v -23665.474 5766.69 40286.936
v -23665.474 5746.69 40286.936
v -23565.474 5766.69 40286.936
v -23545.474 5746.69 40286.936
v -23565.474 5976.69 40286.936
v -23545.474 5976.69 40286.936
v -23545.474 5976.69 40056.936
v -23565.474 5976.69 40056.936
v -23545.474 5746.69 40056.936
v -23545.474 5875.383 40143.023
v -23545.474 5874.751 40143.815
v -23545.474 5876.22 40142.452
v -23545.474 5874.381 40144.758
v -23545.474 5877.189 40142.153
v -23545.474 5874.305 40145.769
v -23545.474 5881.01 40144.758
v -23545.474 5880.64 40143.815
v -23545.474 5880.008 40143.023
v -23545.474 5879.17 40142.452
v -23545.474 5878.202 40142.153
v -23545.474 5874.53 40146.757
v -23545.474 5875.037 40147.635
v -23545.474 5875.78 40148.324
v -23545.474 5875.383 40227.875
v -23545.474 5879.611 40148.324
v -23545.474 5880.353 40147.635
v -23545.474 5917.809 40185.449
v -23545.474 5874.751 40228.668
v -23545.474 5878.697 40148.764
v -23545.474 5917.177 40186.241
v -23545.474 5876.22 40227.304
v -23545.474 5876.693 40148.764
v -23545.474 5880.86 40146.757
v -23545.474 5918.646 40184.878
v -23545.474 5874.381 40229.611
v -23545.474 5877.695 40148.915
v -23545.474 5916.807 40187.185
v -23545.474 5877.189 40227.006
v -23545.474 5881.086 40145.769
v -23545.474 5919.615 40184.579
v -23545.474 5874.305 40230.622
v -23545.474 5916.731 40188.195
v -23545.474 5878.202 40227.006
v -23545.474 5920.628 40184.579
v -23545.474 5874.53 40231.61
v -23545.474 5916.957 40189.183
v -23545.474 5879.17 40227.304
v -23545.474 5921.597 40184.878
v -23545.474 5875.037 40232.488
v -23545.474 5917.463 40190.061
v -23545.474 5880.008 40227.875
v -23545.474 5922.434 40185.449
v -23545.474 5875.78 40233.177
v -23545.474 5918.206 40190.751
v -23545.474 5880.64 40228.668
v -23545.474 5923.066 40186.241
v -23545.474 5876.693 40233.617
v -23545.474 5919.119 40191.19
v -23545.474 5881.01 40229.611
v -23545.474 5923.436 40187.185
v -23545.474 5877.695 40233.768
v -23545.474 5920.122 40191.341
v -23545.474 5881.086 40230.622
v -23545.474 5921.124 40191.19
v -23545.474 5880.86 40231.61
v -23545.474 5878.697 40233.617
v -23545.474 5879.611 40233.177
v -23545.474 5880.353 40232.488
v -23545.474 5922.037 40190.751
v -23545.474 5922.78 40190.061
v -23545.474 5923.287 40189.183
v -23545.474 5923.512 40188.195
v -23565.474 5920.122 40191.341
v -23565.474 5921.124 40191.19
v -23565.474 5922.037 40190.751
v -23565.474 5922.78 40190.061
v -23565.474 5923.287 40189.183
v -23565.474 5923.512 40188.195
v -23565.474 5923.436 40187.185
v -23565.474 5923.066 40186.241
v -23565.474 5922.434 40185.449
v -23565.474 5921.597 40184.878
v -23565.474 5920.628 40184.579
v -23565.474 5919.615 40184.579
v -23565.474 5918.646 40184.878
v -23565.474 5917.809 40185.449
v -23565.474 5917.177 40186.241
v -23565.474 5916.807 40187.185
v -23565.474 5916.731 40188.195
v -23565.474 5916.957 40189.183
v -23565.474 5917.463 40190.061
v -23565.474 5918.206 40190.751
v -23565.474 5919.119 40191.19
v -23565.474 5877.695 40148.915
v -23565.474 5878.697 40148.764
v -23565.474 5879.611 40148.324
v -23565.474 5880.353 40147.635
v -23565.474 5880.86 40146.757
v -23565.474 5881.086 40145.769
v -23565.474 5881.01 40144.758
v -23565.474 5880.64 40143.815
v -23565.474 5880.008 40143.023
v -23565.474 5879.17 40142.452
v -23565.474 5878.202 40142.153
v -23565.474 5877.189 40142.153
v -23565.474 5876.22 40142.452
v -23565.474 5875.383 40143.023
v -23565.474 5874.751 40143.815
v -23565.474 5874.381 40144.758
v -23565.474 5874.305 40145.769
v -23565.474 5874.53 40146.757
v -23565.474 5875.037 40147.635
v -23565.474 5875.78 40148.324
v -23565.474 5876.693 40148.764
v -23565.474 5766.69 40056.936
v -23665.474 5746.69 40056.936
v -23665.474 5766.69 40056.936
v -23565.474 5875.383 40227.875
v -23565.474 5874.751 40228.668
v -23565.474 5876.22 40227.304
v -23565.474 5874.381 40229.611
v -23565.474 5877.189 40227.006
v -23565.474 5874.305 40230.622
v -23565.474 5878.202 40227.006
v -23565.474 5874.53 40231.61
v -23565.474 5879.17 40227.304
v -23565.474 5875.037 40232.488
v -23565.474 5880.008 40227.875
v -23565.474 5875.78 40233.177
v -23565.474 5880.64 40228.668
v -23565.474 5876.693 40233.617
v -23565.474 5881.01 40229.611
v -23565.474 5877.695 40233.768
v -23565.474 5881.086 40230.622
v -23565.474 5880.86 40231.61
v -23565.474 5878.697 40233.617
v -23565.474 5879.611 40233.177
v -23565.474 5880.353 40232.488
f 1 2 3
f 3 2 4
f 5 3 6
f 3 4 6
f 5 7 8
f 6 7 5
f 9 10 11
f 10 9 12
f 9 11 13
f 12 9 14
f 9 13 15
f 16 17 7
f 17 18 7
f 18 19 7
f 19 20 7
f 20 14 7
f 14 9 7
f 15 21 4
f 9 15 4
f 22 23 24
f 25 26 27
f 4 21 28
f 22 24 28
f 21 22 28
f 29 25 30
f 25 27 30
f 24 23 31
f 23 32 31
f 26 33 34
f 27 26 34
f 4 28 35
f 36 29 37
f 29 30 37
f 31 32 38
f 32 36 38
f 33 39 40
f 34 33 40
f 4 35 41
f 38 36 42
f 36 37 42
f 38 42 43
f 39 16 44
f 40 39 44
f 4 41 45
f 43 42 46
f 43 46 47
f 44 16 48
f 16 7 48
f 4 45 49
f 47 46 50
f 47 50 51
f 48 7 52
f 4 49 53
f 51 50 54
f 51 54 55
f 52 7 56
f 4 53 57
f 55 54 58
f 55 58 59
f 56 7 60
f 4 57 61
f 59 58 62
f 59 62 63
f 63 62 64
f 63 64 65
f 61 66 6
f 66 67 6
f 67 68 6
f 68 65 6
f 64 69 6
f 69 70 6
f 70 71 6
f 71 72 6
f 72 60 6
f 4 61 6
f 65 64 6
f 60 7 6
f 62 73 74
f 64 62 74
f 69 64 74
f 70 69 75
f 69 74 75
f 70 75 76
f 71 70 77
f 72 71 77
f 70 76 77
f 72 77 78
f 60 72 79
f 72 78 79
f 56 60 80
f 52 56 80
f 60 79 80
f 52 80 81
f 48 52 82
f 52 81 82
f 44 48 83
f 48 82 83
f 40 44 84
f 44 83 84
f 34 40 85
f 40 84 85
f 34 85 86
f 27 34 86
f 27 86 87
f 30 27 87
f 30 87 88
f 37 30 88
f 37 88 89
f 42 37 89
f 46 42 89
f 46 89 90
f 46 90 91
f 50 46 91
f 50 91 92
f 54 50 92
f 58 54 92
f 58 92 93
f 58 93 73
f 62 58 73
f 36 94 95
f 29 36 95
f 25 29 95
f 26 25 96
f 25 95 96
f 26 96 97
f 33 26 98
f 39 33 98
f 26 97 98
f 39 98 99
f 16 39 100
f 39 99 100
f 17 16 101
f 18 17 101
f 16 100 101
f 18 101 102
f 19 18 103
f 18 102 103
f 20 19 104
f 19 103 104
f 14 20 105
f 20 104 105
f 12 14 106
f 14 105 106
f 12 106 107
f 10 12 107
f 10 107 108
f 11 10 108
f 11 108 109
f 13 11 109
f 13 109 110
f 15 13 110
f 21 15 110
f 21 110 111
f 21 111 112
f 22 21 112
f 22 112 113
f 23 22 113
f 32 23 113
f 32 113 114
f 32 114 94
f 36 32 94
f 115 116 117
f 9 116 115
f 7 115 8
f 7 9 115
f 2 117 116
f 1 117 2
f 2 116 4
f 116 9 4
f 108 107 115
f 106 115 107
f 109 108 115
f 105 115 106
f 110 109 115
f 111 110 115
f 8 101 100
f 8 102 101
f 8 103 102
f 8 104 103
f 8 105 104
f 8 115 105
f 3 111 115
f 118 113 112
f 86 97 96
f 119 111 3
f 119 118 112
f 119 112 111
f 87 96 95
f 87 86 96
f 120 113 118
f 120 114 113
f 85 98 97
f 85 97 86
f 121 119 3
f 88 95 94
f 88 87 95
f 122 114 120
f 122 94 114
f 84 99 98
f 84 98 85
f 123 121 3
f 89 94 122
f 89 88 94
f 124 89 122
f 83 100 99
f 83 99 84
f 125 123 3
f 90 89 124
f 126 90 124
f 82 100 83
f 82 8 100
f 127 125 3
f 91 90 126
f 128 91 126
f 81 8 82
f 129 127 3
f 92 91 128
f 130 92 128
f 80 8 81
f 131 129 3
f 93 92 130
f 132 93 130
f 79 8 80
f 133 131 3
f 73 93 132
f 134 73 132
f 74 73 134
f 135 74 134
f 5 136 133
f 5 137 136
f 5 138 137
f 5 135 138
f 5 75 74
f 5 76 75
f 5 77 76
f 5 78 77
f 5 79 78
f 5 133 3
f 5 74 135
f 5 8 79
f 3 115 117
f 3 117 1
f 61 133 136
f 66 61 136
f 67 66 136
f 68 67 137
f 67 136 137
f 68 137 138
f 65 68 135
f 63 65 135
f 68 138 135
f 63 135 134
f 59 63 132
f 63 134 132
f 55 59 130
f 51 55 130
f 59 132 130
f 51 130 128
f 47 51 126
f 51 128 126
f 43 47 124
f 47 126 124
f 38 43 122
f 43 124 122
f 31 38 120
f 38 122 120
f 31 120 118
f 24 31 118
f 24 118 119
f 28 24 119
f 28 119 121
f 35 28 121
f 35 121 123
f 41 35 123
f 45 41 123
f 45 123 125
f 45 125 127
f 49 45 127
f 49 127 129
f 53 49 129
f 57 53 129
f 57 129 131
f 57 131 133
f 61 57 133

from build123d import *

# Parameters (mm, degrees)
SKETCH1_W           = 230
SKETCH1_H           = 230
BOSS_EXTRUDE1_DEPTH = 20
SKETCH2_R           = 3.4
CUT_EXTRUDE1_DEPTH  = 21
SKETCH3_W           = 230
SKETCH3_H           = 20
BOSS_EXTRUDE2_DEPTH = 100


with BuildPart() as part:
    # Sketch1 → Boss-Extrude1 (new body)
    with BuildSketch(Plane.ZY.offset(23545.4736246)):
        with Locations((40171.936259601, 5861.690204874)):
            Rectangle(SKETCH1_W, SKETCH1_H)
    extrude(amount=BOSS_EXTRUDE1_DEPTH)

    # Sketch2 → Cut-Extrude1 (cut, through all)
    with BuildSketch(Plane.ZY.offset(23565.4736246)):
        with Locations((40187.941310235, 5920.121662379)):
            Circle(SKETCH2_R)
        with Locations((40230.367717106, 5877.695255508)):
            Circle(SKETCH2_R)
        with Locations((40145.514903364, 5877.695255508)):
            Circle(SKETCH2_R)
    extrude(amount=-CUT_EXTRUDE1_DEPTH, mode=Mode.SUBTRACT)

    # Sketch3 → Boss-Extrude2 (add)
    with BuildSketch(Plane.ZY.offset(23565.4736246)):
        with Locations((40171.936259601, 5756.690204874)):
            Rectangle(SKETCH3_W, SKETCH3_H)
    extrude(amount=BOSS_EXTRUDE2_DEPTH)


solid = part.part
